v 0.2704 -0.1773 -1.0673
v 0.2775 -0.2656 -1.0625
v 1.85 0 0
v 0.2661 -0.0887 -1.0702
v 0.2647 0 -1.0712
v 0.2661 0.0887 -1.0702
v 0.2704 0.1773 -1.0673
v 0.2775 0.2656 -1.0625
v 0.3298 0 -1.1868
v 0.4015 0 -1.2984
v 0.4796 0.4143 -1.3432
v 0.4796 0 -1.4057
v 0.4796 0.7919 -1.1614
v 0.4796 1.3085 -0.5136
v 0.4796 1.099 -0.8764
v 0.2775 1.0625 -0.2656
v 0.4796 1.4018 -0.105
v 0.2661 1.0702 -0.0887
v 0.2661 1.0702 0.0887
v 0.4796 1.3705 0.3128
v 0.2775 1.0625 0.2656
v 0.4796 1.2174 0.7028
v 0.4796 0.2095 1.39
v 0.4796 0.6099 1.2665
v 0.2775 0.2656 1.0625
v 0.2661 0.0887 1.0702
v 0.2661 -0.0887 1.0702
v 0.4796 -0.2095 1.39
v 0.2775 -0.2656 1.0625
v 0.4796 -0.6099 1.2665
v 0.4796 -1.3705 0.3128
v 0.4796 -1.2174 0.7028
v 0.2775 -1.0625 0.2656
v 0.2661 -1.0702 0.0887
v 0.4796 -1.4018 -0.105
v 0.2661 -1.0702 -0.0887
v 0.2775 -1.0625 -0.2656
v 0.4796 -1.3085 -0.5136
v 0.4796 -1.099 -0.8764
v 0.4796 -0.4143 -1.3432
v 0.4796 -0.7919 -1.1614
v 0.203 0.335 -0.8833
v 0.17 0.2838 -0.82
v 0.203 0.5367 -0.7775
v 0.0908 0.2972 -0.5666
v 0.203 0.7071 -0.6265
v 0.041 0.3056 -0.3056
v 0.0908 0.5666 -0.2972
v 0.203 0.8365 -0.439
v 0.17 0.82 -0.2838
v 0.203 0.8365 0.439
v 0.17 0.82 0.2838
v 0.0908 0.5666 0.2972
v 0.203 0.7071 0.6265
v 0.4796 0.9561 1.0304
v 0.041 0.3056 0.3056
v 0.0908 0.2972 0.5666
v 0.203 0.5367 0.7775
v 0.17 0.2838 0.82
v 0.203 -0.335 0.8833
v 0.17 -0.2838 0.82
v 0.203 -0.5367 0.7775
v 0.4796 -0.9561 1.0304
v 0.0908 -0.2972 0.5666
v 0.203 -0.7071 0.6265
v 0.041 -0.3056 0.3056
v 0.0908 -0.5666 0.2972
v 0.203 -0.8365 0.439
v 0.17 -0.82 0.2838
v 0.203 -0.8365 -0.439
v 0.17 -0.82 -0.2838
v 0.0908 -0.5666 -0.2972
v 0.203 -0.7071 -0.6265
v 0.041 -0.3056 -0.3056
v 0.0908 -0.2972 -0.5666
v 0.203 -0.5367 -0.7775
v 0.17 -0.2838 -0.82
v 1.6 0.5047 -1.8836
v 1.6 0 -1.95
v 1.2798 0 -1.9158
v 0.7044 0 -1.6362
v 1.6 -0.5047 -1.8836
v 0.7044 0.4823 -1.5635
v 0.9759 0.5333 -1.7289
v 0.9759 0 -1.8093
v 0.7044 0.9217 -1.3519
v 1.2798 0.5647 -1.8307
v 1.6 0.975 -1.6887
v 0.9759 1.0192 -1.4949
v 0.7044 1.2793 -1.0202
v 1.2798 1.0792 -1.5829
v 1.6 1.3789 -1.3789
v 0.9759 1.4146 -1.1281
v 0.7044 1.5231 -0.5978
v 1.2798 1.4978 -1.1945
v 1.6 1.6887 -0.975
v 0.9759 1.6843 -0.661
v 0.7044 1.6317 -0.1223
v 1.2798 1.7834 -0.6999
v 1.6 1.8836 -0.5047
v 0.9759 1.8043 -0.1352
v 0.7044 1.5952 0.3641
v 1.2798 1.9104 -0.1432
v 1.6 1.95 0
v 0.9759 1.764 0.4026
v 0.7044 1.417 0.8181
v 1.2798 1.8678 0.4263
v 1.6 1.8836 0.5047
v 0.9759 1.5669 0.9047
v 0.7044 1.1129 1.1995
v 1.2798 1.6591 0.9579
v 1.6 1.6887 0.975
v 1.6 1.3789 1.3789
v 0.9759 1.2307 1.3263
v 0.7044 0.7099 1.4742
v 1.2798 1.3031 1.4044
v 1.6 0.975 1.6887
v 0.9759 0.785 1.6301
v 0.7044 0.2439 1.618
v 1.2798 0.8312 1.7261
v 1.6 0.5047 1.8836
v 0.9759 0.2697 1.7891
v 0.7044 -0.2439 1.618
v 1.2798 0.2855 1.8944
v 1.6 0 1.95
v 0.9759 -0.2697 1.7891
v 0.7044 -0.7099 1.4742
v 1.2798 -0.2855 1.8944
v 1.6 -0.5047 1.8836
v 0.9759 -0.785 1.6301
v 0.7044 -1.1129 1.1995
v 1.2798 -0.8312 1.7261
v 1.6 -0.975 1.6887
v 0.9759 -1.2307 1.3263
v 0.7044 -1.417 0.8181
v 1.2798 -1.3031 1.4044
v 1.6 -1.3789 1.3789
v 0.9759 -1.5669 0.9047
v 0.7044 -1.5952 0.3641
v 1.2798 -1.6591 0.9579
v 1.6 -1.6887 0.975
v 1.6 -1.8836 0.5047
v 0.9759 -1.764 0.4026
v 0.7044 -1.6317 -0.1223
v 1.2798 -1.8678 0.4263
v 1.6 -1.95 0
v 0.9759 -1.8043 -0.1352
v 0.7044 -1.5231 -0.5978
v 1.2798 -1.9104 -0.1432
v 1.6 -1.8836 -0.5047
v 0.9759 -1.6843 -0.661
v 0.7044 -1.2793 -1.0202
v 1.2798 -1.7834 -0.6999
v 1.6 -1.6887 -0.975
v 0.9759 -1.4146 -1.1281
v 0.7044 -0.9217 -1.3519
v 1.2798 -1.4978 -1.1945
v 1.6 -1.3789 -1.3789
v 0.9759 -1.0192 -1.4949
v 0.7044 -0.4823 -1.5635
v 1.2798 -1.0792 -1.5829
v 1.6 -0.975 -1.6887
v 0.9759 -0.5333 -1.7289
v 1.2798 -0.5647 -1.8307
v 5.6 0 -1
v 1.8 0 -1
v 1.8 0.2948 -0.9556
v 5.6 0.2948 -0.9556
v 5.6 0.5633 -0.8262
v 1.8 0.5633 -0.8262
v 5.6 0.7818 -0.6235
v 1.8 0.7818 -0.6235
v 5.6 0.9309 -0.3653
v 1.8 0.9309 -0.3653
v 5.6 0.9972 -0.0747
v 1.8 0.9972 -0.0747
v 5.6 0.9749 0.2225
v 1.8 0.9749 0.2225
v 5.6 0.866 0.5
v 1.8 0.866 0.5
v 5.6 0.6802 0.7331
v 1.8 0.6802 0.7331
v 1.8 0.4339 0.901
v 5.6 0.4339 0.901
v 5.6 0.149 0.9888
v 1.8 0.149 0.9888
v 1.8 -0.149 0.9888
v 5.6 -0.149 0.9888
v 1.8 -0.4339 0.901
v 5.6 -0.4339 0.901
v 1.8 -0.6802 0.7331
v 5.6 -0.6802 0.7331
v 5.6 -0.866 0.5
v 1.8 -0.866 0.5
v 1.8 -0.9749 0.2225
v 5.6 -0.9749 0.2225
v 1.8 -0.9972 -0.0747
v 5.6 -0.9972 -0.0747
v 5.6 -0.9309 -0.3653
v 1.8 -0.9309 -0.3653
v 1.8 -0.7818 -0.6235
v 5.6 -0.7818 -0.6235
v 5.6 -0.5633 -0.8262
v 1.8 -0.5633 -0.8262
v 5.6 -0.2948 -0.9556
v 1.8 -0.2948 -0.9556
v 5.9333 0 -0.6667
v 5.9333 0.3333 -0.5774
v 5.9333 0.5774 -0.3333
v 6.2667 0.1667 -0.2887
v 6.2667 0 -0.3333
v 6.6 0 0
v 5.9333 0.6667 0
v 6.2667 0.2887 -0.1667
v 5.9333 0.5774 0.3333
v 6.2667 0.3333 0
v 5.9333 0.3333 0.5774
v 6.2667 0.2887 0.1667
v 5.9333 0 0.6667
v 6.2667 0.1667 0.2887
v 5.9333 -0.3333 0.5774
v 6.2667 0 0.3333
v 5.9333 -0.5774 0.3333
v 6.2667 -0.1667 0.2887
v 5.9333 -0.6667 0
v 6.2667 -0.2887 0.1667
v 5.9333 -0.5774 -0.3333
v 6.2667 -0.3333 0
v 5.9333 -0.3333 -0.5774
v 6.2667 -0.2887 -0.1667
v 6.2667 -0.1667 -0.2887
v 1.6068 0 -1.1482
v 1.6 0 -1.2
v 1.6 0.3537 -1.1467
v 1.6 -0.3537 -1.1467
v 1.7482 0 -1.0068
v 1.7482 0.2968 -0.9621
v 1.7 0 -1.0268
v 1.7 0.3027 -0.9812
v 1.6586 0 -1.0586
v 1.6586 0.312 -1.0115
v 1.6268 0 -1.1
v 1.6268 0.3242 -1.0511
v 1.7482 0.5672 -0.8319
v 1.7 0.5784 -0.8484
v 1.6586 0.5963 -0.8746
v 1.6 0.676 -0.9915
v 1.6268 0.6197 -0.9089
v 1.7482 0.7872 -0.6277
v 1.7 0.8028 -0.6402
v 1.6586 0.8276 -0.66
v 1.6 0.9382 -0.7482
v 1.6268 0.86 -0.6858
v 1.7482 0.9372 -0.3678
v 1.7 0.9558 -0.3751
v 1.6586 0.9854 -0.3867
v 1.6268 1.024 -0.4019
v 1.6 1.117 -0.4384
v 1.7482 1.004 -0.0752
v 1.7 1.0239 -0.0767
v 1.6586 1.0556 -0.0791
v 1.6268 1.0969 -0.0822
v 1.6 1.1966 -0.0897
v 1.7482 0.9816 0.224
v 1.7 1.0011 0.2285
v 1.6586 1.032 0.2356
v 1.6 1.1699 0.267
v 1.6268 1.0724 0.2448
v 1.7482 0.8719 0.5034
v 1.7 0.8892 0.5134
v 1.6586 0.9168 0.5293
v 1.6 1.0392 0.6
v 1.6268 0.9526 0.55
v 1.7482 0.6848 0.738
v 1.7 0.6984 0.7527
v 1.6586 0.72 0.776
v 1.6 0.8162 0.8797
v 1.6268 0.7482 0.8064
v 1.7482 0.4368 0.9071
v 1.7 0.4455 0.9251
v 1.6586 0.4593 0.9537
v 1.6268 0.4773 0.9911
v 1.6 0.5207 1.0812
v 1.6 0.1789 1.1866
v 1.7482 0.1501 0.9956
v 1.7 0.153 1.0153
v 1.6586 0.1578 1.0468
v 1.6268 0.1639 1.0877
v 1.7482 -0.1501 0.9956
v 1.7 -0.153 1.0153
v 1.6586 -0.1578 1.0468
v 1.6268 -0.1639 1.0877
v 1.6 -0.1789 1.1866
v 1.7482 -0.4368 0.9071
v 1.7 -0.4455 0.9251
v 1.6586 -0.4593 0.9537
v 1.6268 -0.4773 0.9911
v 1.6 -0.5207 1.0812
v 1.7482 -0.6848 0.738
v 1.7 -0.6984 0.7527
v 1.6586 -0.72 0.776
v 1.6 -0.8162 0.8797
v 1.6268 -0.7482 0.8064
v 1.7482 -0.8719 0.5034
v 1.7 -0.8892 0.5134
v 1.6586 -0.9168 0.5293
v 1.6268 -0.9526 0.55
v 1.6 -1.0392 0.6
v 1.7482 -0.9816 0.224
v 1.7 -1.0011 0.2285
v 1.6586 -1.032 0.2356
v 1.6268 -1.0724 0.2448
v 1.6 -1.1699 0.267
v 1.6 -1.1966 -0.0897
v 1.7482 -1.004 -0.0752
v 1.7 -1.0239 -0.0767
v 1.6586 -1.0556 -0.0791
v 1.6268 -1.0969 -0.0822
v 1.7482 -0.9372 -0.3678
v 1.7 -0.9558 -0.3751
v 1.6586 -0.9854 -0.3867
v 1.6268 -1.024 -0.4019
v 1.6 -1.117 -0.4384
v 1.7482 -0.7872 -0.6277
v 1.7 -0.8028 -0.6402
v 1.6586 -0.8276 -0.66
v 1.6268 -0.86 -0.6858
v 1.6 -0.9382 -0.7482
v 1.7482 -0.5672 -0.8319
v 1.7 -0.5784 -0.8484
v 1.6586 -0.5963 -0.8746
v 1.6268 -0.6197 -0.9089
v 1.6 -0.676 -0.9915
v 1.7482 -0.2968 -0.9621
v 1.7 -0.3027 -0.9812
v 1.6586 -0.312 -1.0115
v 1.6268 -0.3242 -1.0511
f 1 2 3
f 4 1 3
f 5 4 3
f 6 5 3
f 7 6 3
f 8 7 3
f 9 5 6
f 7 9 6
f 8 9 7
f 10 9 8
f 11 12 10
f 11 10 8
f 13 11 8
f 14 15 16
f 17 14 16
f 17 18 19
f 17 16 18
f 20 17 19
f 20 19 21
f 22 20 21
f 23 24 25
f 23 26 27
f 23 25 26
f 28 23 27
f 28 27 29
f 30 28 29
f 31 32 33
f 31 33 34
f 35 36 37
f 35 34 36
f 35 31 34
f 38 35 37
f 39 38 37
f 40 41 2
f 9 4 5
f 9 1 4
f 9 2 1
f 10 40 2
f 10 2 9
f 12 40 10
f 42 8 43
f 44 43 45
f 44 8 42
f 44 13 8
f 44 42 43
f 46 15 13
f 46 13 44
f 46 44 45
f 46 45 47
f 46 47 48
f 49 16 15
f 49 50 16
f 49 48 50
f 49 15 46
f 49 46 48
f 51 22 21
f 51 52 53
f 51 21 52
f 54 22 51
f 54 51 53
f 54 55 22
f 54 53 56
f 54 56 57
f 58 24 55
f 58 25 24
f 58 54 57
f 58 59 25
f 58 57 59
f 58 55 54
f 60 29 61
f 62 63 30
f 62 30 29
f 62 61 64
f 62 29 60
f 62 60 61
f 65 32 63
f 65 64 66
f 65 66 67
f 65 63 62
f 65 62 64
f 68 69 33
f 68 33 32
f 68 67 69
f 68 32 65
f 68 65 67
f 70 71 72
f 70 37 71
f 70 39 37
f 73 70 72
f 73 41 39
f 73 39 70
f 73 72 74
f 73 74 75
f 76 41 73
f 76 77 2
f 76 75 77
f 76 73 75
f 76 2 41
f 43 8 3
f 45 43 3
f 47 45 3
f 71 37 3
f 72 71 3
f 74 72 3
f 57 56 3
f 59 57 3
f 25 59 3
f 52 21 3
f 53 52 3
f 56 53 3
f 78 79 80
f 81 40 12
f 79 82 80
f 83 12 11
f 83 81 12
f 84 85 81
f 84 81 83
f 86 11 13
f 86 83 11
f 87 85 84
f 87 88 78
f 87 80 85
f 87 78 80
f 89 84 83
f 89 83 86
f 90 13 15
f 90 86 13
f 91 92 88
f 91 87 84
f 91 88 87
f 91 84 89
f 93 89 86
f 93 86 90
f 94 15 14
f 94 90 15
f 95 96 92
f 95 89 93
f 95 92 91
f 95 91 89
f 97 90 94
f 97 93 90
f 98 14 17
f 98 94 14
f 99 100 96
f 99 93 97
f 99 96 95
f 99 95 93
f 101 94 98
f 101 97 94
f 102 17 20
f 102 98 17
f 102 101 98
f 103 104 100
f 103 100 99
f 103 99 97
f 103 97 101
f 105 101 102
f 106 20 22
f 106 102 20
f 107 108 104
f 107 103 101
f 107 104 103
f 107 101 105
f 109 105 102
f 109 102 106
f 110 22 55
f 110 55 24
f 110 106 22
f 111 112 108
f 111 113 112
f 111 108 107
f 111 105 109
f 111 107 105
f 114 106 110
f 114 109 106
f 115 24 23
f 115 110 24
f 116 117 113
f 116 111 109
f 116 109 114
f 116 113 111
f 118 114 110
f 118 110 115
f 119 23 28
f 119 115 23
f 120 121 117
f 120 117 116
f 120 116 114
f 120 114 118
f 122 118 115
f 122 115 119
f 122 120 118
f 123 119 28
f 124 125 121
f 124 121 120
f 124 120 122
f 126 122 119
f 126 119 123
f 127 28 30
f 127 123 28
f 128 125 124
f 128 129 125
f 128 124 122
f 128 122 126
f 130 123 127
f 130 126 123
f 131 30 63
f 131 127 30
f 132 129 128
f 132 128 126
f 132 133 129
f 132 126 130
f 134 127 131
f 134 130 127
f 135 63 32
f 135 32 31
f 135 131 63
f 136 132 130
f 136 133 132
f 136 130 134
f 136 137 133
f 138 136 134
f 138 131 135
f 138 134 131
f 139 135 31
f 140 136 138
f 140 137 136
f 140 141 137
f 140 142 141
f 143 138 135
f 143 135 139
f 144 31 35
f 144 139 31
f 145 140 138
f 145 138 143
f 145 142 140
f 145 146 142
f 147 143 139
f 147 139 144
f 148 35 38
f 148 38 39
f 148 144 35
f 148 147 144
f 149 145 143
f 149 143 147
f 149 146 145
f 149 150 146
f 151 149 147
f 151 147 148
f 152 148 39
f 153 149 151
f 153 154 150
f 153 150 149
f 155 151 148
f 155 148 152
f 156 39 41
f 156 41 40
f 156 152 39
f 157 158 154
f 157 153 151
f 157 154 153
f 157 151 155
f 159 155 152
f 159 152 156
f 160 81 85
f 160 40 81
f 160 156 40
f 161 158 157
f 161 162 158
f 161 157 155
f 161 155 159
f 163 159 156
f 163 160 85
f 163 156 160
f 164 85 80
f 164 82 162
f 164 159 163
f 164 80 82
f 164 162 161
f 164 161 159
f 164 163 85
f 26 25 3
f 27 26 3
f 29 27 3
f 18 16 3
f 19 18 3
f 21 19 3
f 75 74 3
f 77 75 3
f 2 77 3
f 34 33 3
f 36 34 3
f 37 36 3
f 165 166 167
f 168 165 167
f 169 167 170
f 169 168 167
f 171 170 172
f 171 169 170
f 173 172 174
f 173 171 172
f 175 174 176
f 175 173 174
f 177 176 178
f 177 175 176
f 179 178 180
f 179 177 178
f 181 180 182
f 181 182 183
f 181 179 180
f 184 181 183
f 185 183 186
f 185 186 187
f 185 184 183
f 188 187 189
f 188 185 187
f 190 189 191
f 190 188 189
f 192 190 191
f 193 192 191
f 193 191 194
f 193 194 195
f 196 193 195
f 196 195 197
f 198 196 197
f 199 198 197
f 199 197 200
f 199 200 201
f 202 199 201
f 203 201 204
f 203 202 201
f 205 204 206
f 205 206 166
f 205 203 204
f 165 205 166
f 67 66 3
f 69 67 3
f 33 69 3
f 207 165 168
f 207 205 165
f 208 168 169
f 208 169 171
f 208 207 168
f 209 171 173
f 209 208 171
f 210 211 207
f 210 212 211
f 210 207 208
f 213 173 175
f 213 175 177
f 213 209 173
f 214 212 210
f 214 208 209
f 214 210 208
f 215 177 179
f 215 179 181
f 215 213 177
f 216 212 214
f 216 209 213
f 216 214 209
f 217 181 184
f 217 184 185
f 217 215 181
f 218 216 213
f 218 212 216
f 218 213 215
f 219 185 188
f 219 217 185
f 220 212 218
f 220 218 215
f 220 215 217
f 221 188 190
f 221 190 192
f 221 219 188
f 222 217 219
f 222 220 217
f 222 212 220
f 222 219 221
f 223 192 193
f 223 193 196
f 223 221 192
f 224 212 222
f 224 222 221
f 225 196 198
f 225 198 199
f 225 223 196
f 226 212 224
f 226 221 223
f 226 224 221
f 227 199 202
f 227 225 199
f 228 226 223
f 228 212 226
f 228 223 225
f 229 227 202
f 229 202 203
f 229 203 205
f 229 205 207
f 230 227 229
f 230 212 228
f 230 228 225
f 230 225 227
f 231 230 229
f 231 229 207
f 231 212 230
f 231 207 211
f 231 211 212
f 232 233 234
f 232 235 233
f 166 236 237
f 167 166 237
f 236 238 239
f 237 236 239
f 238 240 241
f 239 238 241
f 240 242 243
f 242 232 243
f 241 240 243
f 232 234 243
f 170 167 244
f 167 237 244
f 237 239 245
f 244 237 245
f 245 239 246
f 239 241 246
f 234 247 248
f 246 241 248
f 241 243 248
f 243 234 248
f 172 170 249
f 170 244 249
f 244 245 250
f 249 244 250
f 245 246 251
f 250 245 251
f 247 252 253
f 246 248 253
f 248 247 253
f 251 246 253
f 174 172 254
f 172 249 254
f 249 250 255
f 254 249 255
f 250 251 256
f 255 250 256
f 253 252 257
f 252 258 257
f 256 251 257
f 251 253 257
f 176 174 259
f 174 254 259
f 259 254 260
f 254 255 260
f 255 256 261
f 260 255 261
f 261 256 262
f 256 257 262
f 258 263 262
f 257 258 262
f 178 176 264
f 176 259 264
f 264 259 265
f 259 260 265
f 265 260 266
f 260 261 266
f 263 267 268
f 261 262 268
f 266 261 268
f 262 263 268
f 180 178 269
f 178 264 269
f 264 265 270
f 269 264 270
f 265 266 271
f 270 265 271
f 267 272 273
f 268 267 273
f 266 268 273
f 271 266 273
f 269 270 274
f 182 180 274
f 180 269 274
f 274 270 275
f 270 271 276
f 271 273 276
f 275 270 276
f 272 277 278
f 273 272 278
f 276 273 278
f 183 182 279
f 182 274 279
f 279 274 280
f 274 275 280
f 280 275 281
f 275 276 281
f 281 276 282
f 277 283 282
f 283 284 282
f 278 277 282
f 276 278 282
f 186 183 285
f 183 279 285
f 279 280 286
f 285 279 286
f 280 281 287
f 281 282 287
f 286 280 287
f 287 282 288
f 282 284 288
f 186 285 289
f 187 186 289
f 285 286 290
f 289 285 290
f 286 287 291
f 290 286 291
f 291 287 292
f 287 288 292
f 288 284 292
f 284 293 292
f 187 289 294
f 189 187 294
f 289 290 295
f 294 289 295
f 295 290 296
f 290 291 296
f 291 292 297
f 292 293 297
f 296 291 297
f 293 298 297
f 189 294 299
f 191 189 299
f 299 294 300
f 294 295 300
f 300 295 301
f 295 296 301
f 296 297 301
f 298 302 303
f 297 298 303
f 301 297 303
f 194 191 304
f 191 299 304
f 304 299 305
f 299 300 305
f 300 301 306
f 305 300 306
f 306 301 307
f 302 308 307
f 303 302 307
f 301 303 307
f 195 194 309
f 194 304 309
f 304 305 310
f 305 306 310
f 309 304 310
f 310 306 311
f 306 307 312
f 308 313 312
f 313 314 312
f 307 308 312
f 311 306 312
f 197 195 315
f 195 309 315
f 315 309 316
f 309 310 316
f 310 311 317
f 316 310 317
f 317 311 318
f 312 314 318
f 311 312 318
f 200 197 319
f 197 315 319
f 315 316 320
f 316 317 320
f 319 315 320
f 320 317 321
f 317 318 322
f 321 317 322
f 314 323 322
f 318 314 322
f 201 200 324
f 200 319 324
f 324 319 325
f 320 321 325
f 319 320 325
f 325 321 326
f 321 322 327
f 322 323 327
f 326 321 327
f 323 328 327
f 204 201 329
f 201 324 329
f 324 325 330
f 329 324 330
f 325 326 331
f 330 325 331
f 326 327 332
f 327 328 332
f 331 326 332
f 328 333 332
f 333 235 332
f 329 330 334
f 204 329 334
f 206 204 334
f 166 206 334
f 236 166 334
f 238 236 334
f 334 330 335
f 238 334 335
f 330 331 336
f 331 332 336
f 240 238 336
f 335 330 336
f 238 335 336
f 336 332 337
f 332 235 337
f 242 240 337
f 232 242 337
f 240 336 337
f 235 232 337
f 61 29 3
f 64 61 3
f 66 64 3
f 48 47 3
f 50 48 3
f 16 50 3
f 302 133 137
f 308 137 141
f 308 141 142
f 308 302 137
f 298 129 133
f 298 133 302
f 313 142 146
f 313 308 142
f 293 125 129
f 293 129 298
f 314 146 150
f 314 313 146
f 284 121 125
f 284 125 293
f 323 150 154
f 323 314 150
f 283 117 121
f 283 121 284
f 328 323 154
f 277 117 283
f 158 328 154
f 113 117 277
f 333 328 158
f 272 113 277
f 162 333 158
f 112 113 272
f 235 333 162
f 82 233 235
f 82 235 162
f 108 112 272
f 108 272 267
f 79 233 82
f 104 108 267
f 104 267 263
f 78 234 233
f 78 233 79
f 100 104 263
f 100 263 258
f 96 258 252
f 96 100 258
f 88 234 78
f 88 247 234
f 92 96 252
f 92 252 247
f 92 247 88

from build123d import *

# Parameters (mm, degrees)
FILLET2_R = 0.2


with BuildPart() as part:
    # Sketch1 → Revolve1 (revolve)
    with BuildSketch(Plane(origin=(0, 0, 0), x_dir=(1, 0, 0), z_dir=(0, 1, 0))):
        with BuildLine():
            Line((1.6, 1), (6.6, 1))
            Line((6.6, 1), (6.6, 0))
            Line((6.6, 0), (0, 0))
            ThreePointArc((0, 0), (0.12318754, 0.742622052), (0.479554358, 1.405694727))
            ThreePointArc((0.479554358, 1.405694727), (0.97590539, 1.809326647), (1.6, 1.95))
            Line((1.6, 1.95), (1.6, 1))
        make_face()
    revolve(axis=Axis((-13.629268293, 0, 0), (1, 0, 0)))

    # Fillet2
    fillet2_edges = [part.edges().sort_by_distance(p)[0] for p in [
        (1.6, 0, 1),
    ]]
    fillet(fillet2_edges, radius=FILLET2_R)

    # Sketch4 → Cut-Revolve1 (revolve, cut)
    with BuildSketch(Plane(origin=(0, 0, 0), x_dir=(1, 0, 0), z_dir=(0, 1, 0))):
        Polygon((7.333454633, 0), (7.333454633, 21), (-14.4, 21), (6.6, 0), align=None)
    revolve(axis=Axis((4.782773752, 0, 0), (1, 0, 0)), mode=Mode.SUBTRACT)

    # Sketch2 → Cut-Loft1 section 0
    with BuildSketch(Plane(origin=(0, 0, 0), x_dir=(0, 0, -1), z_dir=(1, 0, 0)), mode=Mode.PRIVATE) as cut_loft1_s0:
        Polygon((-0.3125, 0.3125), (-1.25, 0.3125), (-1.25, -0.3125), (-0.3125, -0.3125), (-0.3125, -1.25), (0.3125, -1.25), (0.3125, -0.3125), (1.25, -0.3125), (1.25, 0.3125), (0.3125, 0.3125), (0.3125, 1.25), (-0.3125, 1.25), align=None)
    loft([Vertex(1.85, 0, 0), cut_loft1_s0.sketch], mode=Mode.SUBTRACT)


solid = part.part
